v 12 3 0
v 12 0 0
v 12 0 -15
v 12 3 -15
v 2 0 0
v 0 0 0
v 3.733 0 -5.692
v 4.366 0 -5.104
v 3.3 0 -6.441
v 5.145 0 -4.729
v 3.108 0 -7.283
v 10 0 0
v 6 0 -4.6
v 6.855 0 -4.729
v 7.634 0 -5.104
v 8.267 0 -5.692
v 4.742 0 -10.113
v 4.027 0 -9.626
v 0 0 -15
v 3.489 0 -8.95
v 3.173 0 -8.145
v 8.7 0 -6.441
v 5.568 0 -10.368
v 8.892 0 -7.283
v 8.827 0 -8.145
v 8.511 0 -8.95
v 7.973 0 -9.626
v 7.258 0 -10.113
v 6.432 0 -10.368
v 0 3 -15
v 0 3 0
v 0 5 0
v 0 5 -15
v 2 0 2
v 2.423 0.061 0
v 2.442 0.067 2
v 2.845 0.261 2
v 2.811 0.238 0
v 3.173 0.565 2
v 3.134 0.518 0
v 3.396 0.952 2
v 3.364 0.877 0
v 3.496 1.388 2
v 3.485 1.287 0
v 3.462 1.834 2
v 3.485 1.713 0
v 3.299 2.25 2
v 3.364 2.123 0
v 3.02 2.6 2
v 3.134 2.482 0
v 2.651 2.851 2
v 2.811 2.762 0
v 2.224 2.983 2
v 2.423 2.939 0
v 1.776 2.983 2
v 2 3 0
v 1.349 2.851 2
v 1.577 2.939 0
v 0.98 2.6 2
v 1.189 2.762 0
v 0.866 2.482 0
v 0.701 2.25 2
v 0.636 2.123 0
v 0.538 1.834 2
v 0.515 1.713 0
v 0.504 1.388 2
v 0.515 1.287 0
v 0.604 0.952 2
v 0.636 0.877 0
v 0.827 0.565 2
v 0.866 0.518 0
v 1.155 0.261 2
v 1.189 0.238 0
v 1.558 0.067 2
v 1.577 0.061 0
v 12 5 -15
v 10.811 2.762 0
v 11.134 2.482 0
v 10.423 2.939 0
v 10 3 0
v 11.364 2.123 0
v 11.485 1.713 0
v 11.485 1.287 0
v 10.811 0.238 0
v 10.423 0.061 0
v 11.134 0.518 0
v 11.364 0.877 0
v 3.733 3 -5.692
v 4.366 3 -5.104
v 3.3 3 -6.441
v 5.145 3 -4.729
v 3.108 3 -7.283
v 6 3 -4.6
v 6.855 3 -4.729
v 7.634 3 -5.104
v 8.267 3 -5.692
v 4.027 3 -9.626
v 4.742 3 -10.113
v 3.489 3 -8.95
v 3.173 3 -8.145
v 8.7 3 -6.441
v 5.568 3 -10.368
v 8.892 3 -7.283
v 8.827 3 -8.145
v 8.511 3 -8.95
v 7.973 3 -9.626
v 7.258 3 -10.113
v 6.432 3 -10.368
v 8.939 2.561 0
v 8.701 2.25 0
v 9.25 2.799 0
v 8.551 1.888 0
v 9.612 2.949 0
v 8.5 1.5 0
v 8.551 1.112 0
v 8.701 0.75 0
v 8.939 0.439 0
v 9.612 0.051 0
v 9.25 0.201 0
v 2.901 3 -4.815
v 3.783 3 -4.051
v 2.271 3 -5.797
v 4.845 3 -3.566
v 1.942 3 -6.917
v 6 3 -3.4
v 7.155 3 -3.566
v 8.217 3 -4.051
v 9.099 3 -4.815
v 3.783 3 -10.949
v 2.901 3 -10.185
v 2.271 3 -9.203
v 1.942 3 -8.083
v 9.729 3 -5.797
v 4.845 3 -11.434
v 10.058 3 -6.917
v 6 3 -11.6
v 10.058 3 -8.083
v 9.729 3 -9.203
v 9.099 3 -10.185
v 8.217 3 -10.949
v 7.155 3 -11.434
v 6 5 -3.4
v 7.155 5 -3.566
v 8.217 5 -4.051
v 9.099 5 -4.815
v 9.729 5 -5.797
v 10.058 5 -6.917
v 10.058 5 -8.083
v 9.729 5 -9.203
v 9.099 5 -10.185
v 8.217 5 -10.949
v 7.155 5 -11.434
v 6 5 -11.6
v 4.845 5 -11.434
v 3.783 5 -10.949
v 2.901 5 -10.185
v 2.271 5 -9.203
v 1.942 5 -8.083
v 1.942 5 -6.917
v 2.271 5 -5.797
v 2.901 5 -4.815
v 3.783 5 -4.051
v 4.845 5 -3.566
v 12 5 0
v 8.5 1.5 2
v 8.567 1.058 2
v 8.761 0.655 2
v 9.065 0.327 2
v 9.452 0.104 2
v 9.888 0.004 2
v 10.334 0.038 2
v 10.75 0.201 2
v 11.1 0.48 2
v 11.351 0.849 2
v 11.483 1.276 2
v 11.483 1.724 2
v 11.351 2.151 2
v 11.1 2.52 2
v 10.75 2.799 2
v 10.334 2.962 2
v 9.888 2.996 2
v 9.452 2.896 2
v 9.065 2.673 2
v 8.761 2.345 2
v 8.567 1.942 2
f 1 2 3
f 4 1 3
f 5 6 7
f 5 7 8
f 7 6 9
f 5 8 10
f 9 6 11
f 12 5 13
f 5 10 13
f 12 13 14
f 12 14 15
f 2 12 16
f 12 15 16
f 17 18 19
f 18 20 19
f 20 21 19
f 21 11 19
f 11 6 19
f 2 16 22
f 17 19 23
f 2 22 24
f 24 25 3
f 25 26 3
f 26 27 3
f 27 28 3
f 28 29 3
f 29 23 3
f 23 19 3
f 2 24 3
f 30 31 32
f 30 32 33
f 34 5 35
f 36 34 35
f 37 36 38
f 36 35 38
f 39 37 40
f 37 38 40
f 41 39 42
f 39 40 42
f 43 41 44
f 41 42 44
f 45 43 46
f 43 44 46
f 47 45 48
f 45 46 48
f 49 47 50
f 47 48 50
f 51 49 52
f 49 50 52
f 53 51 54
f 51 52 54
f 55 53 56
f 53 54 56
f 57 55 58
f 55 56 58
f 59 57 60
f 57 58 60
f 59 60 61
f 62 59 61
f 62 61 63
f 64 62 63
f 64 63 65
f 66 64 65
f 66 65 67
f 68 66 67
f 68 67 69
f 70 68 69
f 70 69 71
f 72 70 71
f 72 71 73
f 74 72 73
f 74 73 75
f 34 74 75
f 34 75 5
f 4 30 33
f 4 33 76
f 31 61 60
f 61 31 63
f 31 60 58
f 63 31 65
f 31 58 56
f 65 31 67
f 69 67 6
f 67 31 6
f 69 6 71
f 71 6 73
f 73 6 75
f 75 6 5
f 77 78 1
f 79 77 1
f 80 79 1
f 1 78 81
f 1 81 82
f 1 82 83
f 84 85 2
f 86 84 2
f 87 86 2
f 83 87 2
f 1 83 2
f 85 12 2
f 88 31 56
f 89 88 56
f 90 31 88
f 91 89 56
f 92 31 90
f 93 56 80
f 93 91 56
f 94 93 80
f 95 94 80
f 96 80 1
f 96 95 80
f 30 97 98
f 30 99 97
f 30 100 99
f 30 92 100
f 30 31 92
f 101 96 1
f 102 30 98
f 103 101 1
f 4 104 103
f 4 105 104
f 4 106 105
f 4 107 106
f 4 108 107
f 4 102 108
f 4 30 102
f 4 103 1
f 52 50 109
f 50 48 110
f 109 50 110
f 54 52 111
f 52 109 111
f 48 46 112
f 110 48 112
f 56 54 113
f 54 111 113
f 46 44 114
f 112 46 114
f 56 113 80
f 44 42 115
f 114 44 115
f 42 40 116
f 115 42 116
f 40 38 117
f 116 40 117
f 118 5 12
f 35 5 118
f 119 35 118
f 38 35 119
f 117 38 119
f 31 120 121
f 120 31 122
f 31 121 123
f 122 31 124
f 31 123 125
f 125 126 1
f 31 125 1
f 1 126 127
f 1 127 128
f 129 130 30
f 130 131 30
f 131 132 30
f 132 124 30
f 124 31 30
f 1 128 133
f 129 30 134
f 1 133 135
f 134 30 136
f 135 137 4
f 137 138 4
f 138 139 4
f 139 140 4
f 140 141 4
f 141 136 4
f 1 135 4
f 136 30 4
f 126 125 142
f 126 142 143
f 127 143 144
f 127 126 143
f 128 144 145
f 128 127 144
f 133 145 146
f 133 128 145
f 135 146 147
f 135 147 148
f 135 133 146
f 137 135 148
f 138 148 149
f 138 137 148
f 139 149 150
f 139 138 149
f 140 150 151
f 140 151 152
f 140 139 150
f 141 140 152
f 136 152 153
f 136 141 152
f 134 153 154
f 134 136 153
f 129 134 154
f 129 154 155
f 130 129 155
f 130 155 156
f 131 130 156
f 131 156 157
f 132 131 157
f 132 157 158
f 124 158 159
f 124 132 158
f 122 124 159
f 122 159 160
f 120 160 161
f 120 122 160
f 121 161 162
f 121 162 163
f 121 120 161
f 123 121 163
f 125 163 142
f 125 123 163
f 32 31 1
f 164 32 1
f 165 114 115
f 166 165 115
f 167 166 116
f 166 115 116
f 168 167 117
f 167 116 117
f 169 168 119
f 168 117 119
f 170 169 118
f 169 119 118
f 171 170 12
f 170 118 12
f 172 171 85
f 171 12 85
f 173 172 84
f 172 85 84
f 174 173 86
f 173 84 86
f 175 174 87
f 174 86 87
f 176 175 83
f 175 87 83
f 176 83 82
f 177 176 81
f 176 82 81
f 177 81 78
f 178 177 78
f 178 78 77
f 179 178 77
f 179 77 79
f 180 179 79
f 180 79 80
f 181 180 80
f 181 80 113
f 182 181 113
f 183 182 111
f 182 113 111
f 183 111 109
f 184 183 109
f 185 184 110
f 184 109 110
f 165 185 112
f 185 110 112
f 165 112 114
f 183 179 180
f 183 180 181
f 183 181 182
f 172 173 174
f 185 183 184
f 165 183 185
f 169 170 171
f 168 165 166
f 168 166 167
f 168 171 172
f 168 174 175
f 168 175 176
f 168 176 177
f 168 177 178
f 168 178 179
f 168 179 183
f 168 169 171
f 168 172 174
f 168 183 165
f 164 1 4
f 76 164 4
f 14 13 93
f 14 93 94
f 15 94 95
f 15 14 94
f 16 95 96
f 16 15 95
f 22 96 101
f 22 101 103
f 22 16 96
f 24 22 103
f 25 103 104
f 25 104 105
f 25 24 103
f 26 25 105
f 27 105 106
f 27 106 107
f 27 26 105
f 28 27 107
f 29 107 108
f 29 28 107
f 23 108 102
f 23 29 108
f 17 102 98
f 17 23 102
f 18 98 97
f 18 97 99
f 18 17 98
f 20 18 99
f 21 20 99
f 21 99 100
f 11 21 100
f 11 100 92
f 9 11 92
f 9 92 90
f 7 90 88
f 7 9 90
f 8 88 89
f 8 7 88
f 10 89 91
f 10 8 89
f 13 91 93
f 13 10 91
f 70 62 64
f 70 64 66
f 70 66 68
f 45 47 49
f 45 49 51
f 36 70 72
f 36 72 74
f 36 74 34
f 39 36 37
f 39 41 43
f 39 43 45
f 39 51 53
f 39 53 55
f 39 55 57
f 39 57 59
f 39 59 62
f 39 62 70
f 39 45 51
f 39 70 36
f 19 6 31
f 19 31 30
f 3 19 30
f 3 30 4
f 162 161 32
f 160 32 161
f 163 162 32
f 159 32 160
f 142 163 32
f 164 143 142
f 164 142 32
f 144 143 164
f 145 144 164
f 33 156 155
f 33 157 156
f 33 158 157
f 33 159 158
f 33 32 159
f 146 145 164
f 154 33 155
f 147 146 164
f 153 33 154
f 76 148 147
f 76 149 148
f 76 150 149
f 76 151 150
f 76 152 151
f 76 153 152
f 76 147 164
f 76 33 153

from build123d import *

# Parameters (mm, degrees)
SKETCH_1_W      = 12
SKETCH_1_H      = 15
SKETCH_1_R      = 2.9
EXTRUDE_1_DEPTH = 3
SKETCH_3_W      = 12
SKETCH_3_H      = 15
SKETCH_3_R      = 4.1
EXTRUDE_2_DEPTH = 2
SKETCH_7_R      = 1.5
EXTRUDE_3_DEPTH = 2


with BuildPart() as part:
    # 草图1 → 凸台-拉伸1 (new body)
    with BuildSketch(Plane(origin=(0, 0, 0), x_dir=(1, 0, 0), z_dir=(0, 1, 0))):
        with Locations((6, 7.5)):
            Rectangle(SKETCH_1_W, SKETCH_1_H)
        with Locations(Location((6, 7.5, 0), (0, 0, 270))):
            Circle(SKETCH_1_R, mode=Mode.SUBTRACT)
    extrude(amount=EXTRUDE_1_DEPTH)

    # 草图7 → 凸台-拉伸3 (add)
    with BuildSketch(Plane.XY):
        with Locations(Location((2, 1.5, 0), (0, 0, 270))):
            Circle(SKETCH_7_R)
        with Locations(Location((10, 1.5, 0), (0, 0, 180))):
            Circle(SKETCH_7_R)
    extrude(amount=EXTRUDE_3_DEPTH)


with BuildPart() as body_2:
    # 草图3 → 凸台-拉伸2 (new body)
    with BuildSketch(Plane(origin=(0, 3, 0), x_dir=(1, 0, 0), z_dir=(0, 1, 0))):
        with Locations((6, 7.5)):
            Rectangle(SKETCH_3_W, SKETCH_3_H)
        with Locations(Location((6, 7.5, 0), (0, 0, 270))):
            Circle(SKETCH_3_R, mode=Mode.SUBTRACT)
    extrude(amount=EXTRUDE_2_DEPTH)


solid = Compound([part.part, body_2.part])
